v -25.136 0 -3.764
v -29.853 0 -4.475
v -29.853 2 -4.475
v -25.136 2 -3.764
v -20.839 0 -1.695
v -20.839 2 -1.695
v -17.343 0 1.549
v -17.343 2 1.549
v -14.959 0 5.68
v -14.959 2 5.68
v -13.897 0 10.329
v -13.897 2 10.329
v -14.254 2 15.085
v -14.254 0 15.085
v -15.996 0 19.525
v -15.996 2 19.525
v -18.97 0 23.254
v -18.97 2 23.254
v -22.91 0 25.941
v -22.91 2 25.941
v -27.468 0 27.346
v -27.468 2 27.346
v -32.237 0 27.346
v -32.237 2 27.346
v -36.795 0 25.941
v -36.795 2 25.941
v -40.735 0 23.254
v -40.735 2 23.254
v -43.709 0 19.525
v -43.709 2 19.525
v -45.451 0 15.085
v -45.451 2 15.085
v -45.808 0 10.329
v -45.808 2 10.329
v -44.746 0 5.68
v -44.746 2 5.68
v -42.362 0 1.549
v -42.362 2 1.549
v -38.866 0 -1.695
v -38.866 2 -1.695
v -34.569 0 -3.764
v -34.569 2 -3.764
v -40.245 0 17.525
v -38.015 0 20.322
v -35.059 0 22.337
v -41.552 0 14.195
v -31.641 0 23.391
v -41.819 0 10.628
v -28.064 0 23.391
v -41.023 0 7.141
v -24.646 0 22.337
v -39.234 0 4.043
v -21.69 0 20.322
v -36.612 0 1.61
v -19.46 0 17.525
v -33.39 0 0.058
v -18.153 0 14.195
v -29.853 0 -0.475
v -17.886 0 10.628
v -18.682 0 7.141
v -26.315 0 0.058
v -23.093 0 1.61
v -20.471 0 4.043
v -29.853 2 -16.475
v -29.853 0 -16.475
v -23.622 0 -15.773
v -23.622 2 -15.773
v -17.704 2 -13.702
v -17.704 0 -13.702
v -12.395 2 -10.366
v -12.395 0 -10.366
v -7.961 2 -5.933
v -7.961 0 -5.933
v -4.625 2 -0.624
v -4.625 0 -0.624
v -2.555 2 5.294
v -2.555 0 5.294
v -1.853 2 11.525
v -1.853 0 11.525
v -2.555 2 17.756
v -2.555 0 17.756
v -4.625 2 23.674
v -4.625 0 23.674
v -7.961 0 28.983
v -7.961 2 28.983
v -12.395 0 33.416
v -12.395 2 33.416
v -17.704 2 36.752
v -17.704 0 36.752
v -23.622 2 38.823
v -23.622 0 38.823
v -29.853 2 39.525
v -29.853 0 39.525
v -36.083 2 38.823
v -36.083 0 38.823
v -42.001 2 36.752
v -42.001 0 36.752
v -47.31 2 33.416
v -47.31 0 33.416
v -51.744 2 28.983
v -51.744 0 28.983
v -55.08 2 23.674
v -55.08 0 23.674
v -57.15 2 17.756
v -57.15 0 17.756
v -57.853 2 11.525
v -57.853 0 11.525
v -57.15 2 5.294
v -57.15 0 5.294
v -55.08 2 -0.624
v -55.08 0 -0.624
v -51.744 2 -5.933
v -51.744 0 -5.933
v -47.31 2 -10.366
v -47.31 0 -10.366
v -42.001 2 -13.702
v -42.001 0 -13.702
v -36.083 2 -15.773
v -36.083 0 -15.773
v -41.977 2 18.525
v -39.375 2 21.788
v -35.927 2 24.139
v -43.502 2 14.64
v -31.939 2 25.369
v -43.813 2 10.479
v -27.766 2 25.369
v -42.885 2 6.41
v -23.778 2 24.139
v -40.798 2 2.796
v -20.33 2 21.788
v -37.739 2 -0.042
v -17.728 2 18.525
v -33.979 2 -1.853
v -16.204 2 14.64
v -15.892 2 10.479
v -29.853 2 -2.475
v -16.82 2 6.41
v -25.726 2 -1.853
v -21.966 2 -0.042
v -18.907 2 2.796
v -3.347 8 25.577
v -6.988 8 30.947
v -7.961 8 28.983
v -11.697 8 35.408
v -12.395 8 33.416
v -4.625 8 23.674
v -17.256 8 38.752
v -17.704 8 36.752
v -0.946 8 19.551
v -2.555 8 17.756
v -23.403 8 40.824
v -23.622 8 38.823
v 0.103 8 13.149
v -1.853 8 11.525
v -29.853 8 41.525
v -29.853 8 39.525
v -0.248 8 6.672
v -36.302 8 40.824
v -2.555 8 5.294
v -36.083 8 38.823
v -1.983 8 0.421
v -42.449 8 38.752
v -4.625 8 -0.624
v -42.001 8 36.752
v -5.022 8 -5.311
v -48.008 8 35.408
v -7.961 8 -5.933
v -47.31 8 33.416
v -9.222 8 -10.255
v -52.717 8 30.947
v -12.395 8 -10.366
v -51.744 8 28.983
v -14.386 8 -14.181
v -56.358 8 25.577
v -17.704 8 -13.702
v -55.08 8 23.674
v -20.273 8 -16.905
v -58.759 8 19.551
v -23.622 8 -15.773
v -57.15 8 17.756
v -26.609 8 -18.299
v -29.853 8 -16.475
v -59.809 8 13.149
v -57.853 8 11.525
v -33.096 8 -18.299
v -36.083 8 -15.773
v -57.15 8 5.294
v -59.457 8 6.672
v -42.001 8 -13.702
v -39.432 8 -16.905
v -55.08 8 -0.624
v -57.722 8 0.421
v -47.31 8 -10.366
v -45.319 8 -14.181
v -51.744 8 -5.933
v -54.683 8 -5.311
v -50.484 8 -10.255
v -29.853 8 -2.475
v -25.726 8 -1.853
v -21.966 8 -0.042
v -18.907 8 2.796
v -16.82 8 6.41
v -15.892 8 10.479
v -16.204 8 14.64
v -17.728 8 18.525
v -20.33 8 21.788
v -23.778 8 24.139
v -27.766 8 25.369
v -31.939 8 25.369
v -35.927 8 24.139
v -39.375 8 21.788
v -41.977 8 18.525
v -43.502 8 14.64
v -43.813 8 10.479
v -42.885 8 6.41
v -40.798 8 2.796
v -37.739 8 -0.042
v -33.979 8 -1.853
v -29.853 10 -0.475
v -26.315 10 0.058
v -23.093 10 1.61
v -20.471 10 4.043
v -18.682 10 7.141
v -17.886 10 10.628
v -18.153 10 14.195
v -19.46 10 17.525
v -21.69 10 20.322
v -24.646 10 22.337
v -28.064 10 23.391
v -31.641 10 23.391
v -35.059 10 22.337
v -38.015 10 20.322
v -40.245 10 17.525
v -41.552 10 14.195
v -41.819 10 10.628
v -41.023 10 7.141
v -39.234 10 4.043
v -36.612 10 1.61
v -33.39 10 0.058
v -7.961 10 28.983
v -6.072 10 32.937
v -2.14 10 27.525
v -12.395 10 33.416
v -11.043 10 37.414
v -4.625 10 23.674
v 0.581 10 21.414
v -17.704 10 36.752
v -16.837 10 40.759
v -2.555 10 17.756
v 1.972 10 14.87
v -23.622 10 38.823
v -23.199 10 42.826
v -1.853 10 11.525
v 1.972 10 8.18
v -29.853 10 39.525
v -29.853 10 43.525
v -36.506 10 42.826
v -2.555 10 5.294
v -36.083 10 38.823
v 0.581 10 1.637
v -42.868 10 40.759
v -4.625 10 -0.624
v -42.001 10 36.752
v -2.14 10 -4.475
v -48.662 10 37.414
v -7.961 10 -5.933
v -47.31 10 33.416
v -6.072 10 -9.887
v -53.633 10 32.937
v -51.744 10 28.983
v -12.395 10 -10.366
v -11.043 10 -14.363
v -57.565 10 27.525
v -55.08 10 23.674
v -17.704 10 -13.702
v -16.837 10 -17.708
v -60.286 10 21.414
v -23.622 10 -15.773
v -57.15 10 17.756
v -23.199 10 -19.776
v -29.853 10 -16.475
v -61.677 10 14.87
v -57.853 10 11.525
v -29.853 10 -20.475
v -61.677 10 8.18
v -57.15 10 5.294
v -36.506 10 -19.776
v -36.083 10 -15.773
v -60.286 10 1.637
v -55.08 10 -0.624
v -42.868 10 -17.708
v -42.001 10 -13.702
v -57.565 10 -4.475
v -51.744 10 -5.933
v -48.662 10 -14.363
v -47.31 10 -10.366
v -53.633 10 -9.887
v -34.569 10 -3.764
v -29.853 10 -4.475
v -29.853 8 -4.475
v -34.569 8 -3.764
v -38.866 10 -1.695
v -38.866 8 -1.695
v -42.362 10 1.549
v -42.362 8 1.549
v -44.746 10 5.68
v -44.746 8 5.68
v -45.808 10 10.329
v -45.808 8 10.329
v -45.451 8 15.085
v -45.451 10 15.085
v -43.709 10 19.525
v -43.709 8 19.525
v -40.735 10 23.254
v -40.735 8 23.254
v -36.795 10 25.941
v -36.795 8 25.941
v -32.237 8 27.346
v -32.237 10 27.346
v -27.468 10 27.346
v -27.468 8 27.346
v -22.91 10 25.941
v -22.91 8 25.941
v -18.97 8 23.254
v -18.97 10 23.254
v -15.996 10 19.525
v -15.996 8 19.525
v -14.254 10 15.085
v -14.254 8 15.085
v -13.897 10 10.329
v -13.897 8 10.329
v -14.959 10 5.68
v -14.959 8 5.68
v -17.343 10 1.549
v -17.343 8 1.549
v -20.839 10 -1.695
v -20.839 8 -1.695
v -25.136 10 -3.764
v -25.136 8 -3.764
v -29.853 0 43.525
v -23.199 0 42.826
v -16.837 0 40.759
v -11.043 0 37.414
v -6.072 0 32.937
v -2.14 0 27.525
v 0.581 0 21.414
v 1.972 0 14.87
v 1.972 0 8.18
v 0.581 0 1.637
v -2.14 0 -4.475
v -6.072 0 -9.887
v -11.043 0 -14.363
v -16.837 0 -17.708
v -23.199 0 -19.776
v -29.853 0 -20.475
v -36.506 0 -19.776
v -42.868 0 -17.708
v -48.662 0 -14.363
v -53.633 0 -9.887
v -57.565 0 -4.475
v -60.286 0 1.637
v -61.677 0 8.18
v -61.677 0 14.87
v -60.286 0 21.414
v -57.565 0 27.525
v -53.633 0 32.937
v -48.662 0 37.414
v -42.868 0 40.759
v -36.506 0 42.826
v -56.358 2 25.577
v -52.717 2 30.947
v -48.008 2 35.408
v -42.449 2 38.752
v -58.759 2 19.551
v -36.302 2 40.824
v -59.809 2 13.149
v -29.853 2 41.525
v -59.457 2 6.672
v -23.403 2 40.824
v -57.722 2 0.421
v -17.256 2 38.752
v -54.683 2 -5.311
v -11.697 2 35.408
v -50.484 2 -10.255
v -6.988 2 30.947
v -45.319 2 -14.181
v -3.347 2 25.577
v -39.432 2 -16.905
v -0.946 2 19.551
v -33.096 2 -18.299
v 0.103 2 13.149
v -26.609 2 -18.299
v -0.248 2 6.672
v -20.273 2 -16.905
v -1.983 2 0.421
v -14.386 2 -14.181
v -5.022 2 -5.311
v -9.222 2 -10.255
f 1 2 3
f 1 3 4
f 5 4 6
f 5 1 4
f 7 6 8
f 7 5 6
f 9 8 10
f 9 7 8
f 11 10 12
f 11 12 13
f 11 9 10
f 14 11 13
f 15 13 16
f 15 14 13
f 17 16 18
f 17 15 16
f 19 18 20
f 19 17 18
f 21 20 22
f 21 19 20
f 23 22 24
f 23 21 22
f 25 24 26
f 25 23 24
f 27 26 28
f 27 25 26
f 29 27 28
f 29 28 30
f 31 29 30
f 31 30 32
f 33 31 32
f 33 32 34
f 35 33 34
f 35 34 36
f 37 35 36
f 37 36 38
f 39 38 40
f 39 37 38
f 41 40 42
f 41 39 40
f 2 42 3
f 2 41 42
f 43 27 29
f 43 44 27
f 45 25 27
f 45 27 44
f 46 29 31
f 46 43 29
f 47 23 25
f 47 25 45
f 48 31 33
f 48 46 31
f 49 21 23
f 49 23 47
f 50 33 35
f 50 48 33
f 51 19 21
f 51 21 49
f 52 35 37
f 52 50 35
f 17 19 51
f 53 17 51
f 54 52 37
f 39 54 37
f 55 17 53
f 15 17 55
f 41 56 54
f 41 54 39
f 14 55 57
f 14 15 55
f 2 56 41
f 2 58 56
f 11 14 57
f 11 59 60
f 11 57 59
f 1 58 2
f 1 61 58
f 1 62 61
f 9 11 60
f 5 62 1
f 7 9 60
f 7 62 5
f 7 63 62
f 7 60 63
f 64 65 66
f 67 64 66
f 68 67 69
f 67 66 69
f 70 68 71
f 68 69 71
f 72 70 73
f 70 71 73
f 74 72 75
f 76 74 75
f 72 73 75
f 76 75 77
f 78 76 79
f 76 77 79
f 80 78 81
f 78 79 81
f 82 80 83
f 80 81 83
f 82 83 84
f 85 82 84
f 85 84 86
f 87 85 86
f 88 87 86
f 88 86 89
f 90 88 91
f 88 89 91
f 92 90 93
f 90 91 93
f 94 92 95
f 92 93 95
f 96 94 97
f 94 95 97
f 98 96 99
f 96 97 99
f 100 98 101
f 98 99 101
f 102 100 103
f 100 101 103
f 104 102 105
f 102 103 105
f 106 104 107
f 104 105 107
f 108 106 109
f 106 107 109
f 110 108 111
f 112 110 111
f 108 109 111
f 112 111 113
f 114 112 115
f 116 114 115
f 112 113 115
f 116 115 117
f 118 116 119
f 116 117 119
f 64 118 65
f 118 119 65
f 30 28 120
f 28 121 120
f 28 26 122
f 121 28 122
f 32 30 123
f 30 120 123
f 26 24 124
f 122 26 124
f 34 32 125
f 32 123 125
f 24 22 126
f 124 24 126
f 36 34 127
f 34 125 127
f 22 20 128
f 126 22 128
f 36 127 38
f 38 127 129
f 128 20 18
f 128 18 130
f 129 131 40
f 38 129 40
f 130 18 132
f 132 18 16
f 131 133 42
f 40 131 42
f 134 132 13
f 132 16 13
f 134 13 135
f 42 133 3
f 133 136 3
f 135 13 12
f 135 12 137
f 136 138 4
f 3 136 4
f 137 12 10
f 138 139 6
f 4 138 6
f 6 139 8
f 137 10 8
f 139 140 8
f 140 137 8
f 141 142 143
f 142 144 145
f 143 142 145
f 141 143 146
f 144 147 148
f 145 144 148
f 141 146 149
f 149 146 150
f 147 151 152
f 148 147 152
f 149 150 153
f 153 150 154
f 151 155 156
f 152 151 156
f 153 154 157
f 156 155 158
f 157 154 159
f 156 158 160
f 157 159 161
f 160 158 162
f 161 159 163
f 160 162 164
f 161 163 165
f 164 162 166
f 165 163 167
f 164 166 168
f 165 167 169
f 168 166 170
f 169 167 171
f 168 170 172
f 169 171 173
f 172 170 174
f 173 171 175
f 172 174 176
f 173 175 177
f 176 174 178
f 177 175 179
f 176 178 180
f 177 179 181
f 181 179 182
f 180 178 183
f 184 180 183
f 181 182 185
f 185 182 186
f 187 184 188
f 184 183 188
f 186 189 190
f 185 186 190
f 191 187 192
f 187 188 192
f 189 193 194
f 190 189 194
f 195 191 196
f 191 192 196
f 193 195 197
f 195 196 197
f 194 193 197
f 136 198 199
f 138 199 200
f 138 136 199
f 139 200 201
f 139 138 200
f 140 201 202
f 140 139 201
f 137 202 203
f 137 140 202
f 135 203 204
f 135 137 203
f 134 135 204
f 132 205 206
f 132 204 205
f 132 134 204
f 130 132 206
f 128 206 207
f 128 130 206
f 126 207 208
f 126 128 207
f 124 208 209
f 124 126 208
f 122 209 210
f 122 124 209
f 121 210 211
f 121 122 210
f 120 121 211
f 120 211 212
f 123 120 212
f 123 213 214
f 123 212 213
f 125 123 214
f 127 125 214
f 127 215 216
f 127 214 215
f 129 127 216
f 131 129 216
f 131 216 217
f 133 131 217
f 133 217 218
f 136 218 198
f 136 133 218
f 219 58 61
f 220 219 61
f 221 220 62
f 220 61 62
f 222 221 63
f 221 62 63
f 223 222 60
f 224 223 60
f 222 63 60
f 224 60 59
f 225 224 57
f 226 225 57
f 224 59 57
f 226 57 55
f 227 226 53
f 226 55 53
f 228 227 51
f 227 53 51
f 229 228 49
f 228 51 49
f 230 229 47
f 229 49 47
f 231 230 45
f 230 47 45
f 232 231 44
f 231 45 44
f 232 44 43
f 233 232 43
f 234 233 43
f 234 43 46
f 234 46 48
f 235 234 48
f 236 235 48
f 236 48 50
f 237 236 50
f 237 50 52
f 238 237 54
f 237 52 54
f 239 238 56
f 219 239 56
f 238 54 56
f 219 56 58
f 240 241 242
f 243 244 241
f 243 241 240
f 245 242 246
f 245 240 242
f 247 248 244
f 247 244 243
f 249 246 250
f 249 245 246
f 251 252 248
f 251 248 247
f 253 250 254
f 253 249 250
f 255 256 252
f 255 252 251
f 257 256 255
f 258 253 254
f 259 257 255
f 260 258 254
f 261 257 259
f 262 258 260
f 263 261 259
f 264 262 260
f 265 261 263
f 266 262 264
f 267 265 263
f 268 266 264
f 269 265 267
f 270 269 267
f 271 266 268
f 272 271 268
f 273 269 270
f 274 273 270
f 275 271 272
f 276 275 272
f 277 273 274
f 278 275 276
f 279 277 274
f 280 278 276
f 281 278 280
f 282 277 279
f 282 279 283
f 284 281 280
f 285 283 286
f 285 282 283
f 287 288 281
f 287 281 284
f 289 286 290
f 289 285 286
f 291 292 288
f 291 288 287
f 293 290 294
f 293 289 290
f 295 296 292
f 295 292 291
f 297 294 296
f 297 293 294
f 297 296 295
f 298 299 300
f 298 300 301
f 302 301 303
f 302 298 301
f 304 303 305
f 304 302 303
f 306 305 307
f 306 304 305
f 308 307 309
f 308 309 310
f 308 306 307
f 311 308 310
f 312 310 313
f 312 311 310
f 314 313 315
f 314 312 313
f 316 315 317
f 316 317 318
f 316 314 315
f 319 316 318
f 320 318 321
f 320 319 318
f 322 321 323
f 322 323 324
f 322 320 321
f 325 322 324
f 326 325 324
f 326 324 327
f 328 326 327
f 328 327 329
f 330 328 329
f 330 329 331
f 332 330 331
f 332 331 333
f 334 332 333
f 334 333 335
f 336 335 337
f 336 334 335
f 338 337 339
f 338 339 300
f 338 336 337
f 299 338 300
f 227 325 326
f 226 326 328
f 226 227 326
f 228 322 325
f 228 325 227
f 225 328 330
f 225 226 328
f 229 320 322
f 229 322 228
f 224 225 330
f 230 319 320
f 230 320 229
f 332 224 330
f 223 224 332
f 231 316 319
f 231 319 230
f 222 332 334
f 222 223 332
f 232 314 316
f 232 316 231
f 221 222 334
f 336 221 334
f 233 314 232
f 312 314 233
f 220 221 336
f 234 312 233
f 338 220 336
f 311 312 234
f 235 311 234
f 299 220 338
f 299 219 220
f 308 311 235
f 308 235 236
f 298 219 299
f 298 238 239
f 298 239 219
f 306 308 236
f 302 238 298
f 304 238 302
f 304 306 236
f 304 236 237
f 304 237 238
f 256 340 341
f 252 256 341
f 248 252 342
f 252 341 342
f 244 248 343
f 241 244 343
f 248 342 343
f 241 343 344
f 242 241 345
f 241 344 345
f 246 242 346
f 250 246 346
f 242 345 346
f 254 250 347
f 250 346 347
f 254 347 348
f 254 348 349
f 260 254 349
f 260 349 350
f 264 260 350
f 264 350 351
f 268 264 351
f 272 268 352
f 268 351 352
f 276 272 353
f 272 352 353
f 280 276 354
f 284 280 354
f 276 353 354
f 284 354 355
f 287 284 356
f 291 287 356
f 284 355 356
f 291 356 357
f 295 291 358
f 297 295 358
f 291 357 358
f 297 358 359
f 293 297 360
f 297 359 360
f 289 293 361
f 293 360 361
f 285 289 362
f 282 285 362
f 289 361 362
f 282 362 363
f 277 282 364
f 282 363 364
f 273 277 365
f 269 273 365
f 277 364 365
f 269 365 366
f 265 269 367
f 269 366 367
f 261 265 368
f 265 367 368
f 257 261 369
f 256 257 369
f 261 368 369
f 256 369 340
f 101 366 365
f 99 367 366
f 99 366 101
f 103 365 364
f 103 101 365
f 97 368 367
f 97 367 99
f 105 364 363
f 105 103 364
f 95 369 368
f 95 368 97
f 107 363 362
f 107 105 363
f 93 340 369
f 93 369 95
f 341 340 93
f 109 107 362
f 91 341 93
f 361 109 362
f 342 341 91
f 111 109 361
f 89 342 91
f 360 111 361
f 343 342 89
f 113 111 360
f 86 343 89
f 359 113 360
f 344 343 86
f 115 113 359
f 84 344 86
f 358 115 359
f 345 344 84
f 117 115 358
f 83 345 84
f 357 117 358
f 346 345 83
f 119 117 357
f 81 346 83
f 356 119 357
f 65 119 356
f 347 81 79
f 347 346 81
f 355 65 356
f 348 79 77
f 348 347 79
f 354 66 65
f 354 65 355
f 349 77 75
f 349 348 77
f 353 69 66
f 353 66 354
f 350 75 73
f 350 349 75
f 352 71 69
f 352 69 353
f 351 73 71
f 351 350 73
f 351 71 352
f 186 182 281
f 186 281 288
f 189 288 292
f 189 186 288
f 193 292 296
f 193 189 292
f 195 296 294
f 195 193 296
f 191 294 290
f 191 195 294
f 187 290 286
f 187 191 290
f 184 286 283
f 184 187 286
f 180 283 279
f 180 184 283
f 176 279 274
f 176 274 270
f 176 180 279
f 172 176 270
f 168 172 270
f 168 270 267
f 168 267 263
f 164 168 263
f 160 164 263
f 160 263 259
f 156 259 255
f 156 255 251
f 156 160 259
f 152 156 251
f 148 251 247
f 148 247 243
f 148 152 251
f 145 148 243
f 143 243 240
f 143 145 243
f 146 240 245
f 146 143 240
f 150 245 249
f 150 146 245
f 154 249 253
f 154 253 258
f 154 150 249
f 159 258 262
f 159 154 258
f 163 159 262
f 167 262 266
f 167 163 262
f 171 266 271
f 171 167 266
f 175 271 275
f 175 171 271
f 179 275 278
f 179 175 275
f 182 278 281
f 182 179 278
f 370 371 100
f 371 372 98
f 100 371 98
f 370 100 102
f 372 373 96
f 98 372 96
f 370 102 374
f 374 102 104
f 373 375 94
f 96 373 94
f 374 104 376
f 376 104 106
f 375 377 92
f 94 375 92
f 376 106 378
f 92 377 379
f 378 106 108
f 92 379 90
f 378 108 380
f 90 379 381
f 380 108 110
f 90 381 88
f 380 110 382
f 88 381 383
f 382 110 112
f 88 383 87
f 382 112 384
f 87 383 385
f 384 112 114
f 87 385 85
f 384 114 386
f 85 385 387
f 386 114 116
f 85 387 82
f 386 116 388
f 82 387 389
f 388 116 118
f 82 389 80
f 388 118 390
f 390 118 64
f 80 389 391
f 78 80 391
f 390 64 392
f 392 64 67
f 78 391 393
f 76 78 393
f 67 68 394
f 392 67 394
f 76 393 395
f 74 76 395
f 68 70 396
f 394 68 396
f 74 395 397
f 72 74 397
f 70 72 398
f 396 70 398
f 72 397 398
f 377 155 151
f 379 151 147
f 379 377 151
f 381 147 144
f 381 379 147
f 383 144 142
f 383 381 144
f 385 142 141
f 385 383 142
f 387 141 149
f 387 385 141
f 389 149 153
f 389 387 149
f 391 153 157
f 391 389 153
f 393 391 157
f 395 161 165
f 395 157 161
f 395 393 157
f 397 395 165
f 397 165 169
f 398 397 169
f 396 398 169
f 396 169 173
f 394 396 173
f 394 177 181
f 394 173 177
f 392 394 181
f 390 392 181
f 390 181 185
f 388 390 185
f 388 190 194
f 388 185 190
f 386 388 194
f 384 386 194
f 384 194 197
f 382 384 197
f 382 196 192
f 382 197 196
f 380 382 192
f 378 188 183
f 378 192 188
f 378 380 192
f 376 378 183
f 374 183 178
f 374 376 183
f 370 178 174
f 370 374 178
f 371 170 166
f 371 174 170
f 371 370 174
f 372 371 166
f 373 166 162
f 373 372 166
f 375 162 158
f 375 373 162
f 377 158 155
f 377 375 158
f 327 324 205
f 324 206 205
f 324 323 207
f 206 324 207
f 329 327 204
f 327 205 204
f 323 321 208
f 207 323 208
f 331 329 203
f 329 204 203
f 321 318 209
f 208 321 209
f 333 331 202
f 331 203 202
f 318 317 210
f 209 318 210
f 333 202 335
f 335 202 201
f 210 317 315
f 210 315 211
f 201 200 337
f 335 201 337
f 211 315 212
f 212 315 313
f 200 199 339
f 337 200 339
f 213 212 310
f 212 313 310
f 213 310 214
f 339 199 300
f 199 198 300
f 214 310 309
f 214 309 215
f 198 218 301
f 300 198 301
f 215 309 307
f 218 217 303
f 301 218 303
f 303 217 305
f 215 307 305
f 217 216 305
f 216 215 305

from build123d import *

# Parameters (mm, degrees)
SKETCH21_R          = 32
SKETCH21_R_2        = 30
BOSS_EXTRUDE1_DEPTH = 10
SKETCH22_R          = 14
SKETCH22_R_2        = 12
BOSS_EXTRUDE2_DEPTH = 10
SKETCH23_R          = 30
SKETCH23_R_2        = 28
BOSS_EXTRUDE3_DEPTH = 2
SKETCH24_R          = 16
SKETCH24_R_2        = 14
BOSS_EXTRUDE4_DEPTH = 2
BOSS_EXTRUDE5_START = -2
SKETCH25_R          = 30
SKETCH25_R_2        = 28
BOSS_EXTRUDE5_DEPTH = 2
SKETCH26_R          = 16
SKETCH26_R_2        = 14
BOSS_EXTRUDE6_DEPTH = 2


with BuildPart() as part:
    # Sketch21 → Boss-Extrude1 (new body)
    with BuildSketch(Plane(origin=(0, 0, 0), x_dir=(1, 0, 0), z_dir=(0, 1, 0))):
        with Locations(Location((-29.852518283, -11.525066254, 0), (0, 0, 270))):
            Circle(SKETCH21_R)
        with Locations(Location((-29.852518283, -11.525066254, 0), (0, 0, 270))):
            Circle(SKETCH21_R_2, mode=Mode.SUBTRACT)
    extrude(amount=BOSS_EXTRUDE1_DEPTH)

    # Sketch23 → Boss-Extrude3 (add)
    with BuildSketch(Plane.XZ):
        with Locations(Location((-29.852518283, 11.525066254, 0), (0, 0, 270))):
            Circle(SKETCH23_R)
        with Locations(Location((-29.852518283, 11.525066254, 0), (0, 0, 270))):
            Circle(SKETCH23_R_2, mode=Mode.SUBTRACT)
    extrude(amount=-BOSS_EXTRUDE3_DEPTH)

    # Sketch25 → Boss-Extrude5 (add)
    with BuildSketch(Plane(origin=(0, 10, 0), x_dir=(1, 0, 0), z_dir=(0, 1, 0)).offset(BOSS_EXTRUDE5_START)):
        with Locations(Location((-29.852518283, -11.525066254, 0), (0, 0, 90))):
            Circle(SKETCH25_R)
        with Locations(Location((-29.852518283, -11.525066254, 0), (0, 0, 90))):
            Circle(SKETCH25_R_2, mode=Mode.SUBTRACT)
    extrude(amount=BOSS_EXTRUDE5_DEPTH)


with BuildPart() as body_2:
    # Sketch22 → Boss-Extrude2 (new body)
    with BuildSketch(Plane.XZ):
        with Locations(Location((-29.852518283, 11.525066254, 0), (0, 0, 270))):
            Circle(SKETCH22_R)
        with Locations(Location((-29.852518283, 11.525066254, 0), (0, 0, 270))):
            Circle(SKETCH22_R_2, mode=Mode.SUBTRACT)
    extrude(amount=-BOSS_EXTRUDE2_DEPTH)

    # Sketch24 → Boss-Extrude4 (add)
    with BuildSketch(Plane.XZ):
        with Locations(Location((-29.852518283, 11.525066254, 0), (0, 0, 270))):
            Circle(SKETCH24_R)
        with Locations(Location((-29.852518283, 11.525066254, 0), (0, 0, 270))):
            Circle(SKETCH24_R_2, mode=Mode.SUBTRACT)
    extrude(amount=-BOSS_EXTRUDE4_DEPTH)

    # Sketch26 → Boss-Extrude6 (add)
    with BuildSketch(Plane(origin=(0, 10, 0), x_dir=(1, 0, 0), z_dir=(0, 1, 0))):
        with Locations(Location((-29.852518283, -11.525066254, 0), (0, 0, 90))):
            Circle(SKETCH26_R)
        with Locations(Location((-29.852518283, -11.525066254, 0), (0, 0, 90))):
            Circle(SKETCH26_R_2, mode=Mode.SUBTRACT)
    extrude(amount=-BOSS_EXTRUDE6_DEPTH)


solid = Compound([part.part, body_2.part])
